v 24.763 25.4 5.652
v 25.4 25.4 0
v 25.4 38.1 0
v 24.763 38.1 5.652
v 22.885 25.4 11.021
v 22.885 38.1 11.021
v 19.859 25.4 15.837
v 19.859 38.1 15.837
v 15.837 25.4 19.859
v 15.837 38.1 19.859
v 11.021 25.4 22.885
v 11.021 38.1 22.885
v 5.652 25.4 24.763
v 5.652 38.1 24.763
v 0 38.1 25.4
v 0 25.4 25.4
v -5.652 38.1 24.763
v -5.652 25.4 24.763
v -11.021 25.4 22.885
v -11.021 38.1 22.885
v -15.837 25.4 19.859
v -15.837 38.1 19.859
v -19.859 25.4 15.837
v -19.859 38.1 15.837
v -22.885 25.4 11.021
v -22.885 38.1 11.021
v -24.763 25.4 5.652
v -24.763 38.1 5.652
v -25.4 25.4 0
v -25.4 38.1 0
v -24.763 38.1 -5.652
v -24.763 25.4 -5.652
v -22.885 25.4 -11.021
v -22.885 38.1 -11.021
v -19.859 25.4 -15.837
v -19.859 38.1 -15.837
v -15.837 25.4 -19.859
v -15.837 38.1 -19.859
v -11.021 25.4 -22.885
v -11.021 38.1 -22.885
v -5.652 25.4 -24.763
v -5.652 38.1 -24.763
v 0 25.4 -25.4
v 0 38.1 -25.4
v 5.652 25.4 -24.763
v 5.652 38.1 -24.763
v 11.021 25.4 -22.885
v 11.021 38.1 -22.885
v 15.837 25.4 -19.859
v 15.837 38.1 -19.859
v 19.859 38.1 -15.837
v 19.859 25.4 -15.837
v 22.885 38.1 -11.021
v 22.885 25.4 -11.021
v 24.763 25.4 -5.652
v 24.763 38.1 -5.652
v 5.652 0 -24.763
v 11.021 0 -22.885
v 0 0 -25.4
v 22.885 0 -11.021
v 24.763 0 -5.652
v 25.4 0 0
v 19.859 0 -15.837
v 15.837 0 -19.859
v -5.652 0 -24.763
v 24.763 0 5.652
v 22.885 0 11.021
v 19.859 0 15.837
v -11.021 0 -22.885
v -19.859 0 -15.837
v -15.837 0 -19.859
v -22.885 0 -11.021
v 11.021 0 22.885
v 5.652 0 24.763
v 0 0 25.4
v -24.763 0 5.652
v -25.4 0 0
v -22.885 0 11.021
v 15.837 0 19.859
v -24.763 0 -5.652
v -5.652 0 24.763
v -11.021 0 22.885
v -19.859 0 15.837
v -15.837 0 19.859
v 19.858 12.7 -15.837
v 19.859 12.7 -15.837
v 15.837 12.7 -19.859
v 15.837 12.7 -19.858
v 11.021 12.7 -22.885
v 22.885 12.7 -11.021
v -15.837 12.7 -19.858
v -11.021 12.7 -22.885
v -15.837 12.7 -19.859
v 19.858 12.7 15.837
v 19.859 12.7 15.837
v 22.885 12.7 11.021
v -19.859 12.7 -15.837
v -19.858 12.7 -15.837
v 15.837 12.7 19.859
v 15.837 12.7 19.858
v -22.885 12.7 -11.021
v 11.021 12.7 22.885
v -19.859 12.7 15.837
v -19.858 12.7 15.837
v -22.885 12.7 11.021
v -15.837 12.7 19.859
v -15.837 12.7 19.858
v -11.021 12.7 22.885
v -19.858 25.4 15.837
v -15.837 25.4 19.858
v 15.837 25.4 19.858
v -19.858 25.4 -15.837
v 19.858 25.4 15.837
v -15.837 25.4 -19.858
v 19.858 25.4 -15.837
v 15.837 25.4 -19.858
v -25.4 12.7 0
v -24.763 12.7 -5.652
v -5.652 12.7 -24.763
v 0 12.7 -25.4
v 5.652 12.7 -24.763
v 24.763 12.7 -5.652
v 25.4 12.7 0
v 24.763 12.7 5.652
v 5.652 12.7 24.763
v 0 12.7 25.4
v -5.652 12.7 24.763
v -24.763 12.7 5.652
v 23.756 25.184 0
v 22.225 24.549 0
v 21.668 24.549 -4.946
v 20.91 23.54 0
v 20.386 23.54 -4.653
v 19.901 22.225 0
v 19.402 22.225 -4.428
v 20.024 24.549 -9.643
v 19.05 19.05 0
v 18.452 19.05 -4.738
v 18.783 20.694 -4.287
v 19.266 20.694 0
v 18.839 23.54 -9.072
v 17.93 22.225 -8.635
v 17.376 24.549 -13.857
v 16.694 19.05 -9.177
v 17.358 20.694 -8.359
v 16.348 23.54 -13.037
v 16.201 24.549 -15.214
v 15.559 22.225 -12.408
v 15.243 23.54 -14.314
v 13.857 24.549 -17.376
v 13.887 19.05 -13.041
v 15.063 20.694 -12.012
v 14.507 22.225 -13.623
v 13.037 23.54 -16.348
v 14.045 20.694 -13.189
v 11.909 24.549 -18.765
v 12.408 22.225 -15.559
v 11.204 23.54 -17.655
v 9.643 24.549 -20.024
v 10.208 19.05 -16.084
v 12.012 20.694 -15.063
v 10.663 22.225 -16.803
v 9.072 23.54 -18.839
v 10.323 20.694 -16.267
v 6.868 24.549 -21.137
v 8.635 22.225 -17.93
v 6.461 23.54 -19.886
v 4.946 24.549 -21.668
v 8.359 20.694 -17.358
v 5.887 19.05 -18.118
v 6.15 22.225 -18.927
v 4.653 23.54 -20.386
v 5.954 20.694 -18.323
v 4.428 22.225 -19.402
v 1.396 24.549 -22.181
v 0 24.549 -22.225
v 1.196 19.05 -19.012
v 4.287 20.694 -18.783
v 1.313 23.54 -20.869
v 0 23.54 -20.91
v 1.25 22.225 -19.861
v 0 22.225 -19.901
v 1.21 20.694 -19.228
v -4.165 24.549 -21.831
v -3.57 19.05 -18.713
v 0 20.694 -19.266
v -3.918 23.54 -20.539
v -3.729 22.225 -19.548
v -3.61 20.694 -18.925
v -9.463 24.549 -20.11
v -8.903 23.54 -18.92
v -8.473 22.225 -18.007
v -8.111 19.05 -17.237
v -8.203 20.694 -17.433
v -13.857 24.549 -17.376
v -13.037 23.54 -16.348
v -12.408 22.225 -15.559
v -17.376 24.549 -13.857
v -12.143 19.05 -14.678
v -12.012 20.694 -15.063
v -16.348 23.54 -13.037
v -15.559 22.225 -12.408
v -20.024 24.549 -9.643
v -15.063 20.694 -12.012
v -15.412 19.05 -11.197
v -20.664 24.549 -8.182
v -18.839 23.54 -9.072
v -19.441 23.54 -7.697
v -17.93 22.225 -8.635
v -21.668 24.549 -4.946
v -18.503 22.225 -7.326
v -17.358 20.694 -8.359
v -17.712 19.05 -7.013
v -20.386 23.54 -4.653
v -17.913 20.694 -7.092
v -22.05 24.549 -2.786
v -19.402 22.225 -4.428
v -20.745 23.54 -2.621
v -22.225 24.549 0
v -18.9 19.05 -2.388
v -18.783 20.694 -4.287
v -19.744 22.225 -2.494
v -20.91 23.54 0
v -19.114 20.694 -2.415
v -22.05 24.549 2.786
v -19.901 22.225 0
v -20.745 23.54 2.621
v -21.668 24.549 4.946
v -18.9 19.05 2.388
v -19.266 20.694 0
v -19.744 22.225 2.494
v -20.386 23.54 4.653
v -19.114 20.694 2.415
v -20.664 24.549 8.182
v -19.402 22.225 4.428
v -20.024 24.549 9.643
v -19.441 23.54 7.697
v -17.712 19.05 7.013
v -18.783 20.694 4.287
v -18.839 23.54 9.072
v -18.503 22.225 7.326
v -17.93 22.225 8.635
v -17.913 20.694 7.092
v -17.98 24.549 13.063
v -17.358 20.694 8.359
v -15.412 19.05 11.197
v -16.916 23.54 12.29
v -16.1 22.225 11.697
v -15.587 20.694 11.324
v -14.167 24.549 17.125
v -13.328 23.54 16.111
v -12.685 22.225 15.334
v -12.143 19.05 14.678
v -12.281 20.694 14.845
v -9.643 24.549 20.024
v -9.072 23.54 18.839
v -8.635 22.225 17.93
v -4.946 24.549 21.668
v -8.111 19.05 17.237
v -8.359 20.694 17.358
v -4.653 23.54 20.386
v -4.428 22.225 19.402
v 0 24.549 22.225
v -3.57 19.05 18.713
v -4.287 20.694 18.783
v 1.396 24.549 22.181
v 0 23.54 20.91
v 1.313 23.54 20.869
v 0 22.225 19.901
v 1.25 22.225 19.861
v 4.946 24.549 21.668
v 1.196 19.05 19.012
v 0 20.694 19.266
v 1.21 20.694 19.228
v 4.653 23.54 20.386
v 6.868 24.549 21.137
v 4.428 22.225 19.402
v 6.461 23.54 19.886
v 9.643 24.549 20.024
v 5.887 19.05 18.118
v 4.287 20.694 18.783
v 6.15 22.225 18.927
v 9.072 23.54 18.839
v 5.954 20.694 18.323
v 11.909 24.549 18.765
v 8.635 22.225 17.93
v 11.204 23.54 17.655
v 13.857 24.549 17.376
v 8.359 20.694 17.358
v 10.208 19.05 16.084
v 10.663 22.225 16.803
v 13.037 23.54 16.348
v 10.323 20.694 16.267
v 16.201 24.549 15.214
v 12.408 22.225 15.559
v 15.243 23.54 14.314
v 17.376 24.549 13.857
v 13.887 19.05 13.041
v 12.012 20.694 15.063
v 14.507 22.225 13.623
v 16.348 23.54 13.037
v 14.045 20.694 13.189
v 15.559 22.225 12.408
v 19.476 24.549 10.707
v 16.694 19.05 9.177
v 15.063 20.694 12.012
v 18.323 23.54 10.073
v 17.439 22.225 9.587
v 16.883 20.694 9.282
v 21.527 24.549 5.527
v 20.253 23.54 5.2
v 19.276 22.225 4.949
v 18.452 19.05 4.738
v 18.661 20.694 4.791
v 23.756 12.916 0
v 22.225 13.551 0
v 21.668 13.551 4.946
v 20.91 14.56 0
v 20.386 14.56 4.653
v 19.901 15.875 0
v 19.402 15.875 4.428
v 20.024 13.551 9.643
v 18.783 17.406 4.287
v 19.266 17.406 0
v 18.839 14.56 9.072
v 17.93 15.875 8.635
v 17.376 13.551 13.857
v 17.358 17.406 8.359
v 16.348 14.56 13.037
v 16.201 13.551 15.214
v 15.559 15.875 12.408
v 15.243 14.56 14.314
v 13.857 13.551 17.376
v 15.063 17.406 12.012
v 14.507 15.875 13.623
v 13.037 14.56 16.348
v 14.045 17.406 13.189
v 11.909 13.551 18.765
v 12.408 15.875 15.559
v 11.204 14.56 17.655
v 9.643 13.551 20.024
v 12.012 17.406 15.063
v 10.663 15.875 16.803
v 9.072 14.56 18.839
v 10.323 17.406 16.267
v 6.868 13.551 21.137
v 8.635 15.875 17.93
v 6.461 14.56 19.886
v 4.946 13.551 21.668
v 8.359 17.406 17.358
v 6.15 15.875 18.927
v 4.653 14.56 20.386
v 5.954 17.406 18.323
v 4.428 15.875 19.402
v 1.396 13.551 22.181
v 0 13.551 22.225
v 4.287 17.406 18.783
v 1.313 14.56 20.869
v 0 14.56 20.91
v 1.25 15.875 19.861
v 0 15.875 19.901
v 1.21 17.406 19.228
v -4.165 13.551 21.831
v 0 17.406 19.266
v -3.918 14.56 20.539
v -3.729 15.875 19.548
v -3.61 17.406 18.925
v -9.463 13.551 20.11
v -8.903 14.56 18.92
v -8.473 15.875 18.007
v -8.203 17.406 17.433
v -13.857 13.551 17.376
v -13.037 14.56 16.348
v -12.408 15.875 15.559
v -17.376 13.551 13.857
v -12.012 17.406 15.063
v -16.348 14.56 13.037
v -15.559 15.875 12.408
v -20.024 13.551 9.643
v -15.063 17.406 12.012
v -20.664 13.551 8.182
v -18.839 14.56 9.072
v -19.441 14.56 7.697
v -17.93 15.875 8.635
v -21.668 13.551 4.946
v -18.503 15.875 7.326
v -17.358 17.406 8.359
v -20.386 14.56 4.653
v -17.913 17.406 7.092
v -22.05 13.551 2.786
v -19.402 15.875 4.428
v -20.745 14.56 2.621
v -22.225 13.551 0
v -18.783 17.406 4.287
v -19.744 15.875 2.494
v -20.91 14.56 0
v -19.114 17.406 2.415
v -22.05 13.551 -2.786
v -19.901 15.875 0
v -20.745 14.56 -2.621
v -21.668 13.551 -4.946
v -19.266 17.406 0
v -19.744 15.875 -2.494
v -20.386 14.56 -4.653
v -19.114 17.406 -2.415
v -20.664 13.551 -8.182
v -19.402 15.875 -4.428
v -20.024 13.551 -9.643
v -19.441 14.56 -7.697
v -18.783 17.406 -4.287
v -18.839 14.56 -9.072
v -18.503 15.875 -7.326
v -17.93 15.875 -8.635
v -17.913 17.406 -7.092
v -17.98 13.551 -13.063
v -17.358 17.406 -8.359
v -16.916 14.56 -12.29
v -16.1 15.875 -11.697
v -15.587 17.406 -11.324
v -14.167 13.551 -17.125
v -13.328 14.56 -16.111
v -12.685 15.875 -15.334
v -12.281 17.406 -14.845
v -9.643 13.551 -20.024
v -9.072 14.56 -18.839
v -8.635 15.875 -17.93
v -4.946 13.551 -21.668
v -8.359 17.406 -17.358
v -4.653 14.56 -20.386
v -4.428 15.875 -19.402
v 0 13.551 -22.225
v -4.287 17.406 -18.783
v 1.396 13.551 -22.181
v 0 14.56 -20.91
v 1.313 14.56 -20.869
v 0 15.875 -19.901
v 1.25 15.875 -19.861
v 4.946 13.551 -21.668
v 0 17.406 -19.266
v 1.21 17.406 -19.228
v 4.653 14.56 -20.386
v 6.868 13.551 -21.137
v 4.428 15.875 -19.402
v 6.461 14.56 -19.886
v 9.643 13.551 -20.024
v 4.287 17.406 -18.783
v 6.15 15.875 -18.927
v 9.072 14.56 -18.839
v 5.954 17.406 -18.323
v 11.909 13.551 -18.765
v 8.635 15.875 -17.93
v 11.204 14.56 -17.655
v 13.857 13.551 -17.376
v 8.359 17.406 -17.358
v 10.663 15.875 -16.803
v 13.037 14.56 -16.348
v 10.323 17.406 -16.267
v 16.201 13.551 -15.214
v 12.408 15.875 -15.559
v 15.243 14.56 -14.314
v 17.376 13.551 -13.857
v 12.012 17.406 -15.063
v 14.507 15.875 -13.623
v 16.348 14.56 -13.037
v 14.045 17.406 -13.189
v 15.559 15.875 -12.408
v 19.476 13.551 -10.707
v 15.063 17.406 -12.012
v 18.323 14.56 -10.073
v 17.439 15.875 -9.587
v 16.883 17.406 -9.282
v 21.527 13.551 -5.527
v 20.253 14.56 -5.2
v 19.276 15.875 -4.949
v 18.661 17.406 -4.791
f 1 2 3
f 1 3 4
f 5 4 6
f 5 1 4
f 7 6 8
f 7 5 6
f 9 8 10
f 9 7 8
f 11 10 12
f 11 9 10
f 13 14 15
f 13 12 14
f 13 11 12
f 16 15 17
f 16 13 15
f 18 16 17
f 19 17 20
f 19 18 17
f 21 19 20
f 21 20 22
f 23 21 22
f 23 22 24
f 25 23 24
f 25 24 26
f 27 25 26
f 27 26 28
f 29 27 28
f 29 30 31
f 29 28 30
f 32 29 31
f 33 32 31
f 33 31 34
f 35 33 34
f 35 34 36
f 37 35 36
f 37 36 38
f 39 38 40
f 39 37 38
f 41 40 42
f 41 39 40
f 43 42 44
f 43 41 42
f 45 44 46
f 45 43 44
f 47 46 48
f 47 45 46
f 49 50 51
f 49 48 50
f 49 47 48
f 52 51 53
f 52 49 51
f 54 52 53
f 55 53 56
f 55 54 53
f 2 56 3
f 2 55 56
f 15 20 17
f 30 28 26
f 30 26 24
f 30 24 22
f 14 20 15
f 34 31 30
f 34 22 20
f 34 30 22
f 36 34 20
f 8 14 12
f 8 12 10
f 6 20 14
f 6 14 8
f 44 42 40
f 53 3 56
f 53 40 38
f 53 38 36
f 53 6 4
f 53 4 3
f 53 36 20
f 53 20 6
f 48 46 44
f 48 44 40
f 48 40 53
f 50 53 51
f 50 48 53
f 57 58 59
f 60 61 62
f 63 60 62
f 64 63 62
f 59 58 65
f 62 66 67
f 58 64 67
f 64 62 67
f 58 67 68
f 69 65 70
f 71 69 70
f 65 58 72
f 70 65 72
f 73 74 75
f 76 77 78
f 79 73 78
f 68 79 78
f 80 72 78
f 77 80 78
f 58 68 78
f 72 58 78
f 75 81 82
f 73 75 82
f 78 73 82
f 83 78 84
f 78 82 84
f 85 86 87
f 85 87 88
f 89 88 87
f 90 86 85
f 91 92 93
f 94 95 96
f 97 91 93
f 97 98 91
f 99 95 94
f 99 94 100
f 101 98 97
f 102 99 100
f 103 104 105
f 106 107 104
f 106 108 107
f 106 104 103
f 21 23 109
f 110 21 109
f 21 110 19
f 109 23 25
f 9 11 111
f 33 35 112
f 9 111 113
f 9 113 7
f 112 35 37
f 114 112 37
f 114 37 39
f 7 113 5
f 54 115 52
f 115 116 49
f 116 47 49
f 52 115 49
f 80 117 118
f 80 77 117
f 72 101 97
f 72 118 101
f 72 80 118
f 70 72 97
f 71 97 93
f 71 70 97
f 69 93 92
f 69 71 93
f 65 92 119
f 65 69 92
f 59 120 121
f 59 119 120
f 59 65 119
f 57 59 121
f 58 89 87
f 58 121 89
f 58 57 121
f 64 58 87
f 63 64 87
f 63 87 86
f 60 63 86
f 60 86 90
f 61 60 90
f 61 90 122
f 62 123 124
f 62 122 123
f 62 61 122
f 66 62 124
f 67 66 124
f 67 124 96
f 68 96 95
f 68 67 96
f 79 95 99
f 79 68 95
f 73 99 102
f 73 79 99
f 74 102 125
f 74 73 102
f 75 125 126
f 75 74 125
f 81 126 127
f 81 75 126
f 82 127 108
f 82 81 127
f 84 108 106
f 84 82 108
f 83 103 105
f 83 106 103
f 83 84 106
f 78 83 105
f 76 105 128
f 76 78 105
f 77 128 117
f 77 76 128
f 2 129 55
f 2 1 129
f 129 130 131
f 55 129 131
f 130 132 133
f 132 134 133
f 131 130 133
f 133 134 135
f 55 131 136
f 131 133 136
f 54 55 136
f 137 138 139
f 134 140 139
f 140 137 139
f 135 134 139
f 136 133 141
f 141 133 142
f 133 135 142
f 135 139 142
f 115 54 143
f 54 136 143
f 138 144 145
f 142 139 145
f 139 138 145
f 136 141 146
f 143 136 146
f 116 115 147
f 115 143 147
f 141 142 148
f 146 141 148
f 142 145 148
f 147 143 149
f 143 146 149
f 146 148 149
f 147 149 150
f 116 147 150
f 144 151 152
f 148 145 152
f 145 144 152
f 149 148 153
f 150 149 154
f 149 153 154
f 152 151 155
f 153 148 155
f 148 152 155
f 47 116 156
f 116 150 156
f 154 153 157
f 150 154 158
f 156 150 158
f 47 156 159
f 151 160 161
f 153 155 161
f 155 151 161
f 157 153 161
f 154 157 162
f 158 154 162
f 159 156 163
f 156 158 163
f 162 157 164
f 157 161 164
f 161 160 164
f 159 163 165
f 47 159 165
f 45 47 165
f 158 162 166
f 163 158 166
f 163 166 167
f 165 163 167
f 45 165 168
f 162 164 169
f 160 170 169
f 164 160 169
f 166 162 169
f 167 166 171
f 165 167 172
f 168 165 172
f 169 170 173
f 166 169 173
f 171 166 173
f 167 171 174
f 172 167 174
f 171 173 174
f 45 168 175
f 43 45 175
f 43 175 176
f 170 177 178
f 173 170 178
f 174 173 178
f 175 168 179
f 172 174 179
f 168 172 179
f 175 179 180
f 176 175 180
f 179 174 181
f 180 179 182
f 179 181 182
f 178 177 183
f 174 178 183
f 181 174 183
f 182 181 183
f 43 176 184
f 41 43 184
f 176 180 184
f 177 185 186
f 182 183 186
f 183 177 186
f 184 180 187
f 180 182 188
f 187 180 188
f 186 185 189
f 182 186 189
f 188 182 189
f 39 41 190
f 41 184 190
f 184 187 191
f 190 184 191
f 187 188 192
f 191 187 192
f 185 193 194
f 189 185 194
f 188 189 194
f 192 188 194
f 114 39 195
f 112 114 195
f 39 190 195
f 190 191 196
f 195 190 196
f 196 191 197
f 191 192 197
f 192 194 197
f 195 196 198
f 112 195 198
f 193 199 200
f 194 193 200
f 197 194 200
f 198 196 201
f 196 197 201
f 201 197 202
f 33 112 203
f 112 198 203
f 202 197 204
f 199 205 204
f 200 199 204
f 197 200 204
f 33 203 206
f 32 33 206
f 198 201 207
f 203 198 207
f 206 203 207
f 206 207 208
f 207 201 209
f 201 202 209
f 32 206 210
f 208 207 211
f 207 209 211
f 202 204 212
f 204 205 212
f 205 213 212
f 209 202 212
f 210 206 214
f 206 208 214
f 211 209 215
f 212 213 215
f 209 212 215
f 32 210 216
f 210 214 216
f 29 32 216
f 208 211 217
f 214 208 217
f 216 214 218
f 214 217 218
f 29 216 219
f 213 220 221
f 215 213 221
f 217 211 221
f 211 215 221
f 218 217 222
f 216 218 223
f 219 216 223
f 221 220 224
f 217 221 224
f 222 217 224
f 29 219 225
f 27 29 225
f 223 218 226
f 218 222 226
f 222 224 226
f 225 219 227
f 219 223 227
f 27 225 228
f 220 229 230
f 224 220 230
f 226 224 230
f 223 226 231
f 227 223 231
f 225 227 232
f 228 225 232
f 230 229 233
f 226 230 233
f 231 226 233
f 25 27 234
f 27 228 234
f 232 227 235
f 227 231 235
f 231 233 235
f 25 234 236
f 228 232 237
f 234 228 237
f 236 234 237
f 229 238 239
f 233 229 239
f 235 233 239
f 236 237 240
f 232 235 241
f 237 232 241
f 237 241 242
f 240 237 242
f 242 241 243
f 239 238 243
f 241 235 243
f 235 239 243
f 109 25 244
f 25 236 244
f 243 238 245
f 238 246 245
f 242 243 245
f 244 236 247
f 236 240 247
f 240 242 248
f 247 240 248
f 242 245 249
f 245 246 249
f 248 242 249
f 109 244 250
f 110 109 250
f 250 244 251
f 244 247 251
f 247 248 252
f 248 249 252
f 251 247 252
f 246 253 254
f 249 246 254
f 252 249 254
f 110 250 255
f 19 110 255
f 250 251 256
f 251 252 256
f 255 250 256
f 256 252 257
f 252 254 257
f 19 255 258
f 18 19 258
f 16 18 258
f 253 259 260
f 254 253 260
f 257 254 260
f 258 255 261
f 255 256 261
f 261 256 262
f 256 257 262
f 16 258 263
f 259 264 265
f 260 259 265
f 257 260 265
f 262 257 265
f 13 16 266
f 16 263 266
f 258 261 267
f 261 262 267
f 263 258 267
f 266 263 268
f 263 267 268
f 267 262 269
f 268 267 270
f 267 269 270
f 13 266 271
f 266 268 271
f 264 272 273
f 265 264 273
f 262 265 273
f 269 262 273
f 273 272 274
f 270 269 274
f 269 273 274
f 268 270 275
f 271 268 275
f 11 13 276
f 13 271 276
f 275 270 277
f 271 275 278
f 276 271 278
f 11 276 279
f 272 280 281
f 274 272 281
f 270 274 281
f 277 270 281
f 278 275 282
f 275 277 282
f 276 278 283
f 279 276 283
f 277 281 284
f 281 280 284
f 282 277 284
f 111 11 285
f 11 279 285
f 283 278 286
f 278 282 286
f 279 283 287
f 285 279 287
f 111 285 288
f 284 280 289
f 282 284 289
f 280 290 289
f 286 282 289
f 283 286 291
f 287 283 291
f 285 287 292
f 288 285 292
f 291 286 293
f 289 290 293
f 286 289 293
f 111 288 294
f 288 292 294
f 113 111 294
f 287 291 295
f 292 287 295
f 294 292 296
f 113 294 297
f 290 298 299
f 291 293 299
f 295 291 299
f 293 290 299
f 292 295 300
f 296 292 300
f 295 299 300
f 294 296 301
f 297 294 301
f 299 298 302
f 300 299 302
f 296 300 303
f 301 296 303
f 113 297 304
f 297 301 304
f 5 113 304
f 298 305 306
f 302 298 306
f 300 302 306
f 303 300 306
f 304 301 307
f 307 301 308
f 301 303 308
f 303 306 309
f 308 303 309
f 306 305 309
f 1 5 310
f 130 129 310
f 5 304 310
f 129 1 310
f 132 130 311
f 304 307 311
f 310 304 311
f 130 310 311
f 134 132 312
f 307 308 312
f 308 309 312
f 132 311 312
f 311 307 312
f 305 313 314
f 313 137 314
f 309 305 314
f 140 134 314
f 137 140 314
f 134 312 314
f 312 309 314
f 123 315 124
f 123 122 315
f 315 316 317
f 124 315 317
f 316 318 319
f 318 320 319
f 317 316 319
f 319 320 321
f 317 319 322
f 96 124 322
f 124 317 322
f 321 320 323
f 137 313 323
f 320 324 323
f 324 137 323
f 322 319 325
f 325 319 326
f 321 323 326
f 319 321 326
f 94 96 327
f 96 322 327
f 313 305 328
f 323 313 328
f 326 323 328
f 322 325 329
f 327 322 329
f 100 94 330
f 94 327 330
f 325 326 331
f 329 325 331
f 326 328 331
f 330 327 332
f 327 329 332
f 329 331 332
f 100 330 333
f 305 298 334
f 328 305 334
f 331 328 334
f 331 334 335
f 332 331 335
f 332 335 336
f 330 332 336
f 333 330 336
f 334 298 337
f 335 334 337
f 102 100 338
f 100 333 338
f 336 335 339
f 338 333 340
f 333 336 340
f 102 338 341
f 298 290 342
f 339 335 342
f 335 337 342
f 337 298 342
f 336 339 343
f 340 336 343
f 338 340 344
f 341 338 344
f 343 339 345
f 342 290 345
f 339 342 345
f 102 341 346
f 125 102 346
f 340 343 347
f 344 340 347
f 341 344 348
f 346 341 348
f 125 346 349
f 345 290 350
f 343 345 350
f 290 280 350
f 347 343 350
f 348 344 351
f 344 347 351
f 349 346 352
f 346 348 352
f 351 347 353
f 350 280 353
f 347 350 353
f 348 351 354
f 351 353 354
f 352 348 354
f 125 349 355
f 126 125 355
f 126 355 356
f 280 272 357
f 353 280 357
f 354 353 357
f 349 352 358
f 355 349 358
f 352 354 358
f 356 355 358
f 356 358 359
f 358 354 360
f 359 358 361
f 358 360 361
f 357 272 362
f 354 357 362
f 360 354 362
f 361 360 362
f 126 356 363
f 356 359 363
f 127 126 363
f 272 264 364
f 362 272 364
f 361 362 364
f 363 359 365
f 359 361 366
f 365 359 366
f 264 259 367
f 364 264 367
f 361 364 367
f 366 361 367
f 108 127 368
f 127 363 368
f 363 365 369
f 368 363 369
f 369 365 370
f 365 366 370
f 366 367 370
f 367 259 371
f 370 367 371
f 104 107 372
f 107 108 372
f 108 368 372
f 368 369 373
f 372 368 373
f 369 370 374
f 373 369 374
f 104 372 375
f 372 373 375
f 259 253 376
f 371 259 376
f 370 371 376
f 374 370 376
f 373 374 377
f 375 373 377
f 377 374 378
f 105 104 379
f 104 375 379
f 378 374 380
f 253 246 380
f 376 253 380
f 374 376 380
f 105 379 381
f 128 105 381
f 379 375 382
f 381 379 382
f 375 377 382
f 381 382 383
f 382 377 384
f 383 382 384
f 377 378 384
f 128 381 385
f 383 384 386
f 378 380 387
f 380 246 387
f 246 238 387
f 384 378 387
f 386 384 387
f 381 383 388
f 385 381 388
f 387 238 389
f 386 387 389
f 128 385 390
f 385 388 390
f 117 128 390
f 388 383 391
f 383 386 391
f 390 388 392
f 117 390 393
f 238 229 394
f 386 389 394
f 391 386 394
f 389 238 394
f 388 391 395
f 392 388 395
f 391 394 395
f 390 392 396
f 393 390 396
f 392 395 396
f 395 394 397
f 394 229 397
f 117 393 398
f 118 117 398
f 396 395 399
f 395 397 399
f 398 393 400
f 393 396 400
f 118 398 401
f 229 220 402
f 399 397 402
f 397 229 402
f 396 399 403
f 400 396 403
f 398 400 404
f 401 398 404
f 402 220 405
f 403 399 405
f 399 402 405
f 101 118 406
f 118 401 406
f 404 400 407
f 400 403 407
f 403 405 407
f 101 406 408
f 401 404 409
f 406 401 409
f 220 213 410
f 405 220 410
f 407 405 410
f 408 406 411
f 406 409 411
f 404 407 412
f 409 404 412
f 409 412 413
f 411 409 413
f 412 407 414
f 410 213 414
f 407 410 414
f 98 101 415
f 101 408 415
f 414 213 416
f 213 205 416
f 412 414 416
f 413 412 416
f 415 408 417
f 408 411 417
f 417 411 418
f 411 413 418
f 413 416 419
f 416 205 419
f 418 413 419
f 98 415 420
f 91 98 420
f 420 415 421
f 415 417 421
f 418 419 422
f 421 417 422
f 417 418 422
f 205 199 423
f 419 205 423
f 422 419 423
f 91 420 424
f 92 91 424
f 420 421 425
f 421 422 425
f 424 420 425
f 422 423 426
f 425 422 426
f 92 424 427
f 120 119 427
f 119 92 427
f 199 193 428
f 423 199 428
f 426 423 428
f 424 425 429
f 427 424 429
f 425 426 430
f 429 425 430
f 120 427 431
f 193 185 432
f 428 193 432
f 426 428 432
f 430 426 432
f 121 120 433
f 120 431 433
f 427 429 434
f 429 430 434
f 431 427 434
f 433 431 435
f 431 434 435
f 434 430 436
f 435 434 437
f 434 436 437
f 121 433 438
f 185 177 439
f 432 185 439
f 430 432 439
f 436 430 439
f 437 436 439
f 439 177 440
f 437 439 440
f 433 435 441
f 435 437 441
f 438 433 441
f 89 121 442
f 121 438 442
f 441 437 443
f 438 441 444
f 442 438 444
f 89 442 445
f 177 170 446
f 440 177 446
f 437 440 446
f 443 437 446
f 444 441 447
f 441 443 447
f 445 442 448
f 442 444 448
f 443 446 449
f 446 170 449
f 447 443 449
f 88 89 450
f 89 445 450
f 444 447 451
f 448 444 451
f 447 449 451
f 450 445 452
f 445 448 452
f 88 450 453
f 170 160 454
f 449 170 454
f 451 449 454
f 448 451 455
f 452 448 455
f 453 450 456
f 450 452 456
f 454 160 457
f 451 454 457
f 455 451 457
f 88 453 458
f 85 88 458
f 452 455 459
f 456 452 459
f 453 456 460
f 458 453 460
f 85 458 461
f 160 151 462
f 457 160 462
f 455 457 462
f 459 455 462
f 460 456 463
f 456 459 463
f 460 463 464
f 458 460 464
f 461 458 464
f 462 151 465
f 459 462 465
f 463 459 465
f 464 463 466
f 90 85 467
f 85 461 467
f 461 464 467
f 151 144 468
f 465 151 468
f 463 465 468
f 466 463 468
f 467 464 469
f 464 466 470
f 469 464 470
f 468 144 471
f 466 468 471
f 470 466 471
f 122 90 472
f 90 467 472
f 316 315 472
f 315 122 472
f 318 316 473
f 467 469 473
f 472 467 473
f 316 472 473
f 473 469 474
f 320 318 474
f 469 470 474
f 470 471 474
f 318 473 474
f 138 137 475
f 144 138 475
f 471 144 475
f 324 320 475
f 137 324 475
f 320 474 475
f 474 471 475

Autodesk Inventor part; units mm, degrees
ref_plane "YZ Plane" through (0, 0, 0) normal (1, 0, 0) x (0, 1, 0)
ref_plane "XZ Plane" through (0, 0, 0) normal (0, 1, 0) x (-1, 0, 0)
ref_plane "XY Plane" through (0, 0, 0) normal (0, 0, 1) x (1, 0, 0)
sketch "Sketch1" plane through (0, 0, 0) normal (0, 1, 0) x (-1, 0, 0)
  circle A0 centre (0, 0) radius 25.4
  dimension "d0" = 50.8
extrude "Extrusion1" add sketch "Sketch1" along normal blind 12.7
sketch "Sketch2" plane through (0, 12.7, 0) normal (0, 1, 0) x (1, 0, 0)
  circle A0 centre (0, 0) radius 19.05
  dimension "d3" = 38.1
extrude "Extrusion2" add sketch "Sketch2" along normal blind 12.7
fillet "Fillet1" radius 6.35 1 edges at (-19.05, 12.7, 0)
sketch "Sketch3" plane through (0, 25.4, 0) normal (0, 1, 0) x (1, 0, 0)
  circle A0 centre (0, 0) radius 25.4
  dimension "d7" = 50.8
extrude "Extrusion3" add sketch "Sketch3" along normal blind 12.7
fillet "Fillet2" radius 6.35 1 edges at (-19.05, 25.4, 0)
